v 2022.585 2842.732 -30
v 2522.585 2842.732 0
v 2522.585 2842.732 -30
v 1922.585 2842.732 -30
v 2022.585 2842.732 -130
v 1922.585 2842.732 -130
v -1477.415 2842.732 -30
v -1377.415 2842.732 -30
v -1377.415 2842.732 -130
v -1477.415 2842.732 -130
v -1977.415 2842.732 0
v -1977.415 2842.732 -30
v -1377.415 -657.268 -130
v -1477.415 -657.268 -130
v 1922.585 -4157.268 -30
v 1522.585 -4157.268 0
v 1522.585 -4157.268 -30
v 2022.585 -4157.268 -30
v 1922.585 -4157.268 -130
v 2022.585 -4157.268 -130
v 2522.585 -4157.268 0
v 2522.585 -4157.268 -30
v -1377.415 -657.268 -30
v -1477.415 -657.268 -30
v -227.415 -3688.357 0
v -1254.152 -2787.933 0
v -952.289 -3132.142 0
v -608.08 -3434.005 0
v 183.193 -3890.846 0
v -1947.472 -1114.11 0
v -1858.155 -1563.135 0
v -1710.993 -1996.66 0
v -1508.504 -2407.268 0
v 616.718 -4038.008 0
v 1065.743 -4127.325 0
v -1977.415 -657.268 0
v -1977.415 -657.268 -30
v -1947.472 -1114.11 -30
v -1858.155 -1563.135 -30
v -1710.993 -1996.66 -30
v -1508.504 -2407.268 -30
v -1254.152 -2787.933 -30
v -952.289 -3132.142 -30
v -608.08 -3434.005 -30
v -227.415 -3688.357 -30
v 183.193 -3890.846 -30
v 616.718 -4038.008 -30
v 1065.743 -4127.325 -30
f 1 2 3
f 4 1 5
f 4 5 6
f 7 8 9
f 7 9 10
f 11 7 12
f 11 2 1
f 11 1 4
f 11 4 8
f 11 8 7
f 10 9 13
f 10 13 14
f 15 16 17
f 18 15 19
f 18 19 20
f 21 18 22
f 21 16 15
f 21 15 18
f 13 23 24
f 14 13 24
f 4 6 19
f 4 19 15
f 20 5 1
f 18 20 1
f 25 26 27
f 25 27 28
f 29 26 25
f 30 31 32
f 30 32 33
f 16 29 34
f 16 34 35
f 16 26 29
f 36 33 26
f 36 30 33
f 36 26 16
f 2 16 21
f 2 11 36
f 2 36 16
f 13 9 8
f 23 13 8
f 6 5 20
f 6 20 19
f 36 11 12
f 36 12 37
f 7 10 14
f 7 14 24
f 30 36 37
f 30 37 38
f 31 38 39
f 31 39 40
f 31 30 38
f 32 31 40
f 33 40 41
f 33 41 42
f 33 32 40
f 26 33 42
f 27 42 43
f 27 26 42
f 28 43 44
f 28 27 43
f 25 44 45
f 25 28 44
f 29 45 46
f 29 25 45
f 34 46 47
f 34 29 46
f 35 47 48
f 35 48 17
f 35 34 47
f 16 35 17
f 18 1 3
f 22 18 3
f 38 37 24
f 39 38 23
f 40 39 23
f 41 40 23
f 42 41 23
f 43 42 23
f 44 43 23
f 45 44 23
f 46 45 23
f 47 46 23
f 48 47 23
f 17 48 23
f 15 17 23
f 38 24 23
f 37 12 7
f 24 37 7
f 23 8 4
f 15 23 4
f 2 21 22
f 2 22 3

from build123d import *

# Parameters (mm, degrees)
F1_DEPTH = 29.999999
F2_W     = 100
F2_H     = 100
F3_DEPTH = 7000
F4_W     = 100
F4_H     = 100
F5_DEPTH = 3500


with BuildPart() as f1:
    # F0 (on Top) → F1 (new body)
    with BuildSketch(Plane.XY):
        with BuildLine():
            ThreePointArc((-1977.415055, -657.267908), (-952.288789, -3132.141642), (1522.584945, -4157.267908))
            Line((1522.584945, -4157.267908), (2522.584945, -4157.267908))
            Line((2522.584945, -4157.267908), (2522.584945, 2842.732092))
            Line((2522.584945, 2842.732092), (-1977.415055, 2842.732092))
            Line((-1977.415055, 2842.732092), (-1977.415055, -657.267908))
        make_face()
    extrude(amount=-F1_DEPTH)

    # F2 (on face) → F3 (join, through all)
    with BuildSketch(Plane(origin=(0, 2842.732092, 0), x_dir=(-1, 0, 0), z_dir=(0, 1, 0))):
        with Locations((-1972.584945, -79.999999)):
            Rectangle(F2_W, F2_H)
    extrude(amount=-F3_DEPTH)

    # F4 (on face) → F5 (join)
    with BuildSketch(Plane(origin=(0, 2842.732092, 0), x_dir=(-1, 0, 0), z_dir=(0, 1, 0))):
        with Locations((1427.415055, -79.999999)):
            Rectangle(F4_W, F4_H)
    extrude(amount=-F5_DEPTH)


solid = f1.part
